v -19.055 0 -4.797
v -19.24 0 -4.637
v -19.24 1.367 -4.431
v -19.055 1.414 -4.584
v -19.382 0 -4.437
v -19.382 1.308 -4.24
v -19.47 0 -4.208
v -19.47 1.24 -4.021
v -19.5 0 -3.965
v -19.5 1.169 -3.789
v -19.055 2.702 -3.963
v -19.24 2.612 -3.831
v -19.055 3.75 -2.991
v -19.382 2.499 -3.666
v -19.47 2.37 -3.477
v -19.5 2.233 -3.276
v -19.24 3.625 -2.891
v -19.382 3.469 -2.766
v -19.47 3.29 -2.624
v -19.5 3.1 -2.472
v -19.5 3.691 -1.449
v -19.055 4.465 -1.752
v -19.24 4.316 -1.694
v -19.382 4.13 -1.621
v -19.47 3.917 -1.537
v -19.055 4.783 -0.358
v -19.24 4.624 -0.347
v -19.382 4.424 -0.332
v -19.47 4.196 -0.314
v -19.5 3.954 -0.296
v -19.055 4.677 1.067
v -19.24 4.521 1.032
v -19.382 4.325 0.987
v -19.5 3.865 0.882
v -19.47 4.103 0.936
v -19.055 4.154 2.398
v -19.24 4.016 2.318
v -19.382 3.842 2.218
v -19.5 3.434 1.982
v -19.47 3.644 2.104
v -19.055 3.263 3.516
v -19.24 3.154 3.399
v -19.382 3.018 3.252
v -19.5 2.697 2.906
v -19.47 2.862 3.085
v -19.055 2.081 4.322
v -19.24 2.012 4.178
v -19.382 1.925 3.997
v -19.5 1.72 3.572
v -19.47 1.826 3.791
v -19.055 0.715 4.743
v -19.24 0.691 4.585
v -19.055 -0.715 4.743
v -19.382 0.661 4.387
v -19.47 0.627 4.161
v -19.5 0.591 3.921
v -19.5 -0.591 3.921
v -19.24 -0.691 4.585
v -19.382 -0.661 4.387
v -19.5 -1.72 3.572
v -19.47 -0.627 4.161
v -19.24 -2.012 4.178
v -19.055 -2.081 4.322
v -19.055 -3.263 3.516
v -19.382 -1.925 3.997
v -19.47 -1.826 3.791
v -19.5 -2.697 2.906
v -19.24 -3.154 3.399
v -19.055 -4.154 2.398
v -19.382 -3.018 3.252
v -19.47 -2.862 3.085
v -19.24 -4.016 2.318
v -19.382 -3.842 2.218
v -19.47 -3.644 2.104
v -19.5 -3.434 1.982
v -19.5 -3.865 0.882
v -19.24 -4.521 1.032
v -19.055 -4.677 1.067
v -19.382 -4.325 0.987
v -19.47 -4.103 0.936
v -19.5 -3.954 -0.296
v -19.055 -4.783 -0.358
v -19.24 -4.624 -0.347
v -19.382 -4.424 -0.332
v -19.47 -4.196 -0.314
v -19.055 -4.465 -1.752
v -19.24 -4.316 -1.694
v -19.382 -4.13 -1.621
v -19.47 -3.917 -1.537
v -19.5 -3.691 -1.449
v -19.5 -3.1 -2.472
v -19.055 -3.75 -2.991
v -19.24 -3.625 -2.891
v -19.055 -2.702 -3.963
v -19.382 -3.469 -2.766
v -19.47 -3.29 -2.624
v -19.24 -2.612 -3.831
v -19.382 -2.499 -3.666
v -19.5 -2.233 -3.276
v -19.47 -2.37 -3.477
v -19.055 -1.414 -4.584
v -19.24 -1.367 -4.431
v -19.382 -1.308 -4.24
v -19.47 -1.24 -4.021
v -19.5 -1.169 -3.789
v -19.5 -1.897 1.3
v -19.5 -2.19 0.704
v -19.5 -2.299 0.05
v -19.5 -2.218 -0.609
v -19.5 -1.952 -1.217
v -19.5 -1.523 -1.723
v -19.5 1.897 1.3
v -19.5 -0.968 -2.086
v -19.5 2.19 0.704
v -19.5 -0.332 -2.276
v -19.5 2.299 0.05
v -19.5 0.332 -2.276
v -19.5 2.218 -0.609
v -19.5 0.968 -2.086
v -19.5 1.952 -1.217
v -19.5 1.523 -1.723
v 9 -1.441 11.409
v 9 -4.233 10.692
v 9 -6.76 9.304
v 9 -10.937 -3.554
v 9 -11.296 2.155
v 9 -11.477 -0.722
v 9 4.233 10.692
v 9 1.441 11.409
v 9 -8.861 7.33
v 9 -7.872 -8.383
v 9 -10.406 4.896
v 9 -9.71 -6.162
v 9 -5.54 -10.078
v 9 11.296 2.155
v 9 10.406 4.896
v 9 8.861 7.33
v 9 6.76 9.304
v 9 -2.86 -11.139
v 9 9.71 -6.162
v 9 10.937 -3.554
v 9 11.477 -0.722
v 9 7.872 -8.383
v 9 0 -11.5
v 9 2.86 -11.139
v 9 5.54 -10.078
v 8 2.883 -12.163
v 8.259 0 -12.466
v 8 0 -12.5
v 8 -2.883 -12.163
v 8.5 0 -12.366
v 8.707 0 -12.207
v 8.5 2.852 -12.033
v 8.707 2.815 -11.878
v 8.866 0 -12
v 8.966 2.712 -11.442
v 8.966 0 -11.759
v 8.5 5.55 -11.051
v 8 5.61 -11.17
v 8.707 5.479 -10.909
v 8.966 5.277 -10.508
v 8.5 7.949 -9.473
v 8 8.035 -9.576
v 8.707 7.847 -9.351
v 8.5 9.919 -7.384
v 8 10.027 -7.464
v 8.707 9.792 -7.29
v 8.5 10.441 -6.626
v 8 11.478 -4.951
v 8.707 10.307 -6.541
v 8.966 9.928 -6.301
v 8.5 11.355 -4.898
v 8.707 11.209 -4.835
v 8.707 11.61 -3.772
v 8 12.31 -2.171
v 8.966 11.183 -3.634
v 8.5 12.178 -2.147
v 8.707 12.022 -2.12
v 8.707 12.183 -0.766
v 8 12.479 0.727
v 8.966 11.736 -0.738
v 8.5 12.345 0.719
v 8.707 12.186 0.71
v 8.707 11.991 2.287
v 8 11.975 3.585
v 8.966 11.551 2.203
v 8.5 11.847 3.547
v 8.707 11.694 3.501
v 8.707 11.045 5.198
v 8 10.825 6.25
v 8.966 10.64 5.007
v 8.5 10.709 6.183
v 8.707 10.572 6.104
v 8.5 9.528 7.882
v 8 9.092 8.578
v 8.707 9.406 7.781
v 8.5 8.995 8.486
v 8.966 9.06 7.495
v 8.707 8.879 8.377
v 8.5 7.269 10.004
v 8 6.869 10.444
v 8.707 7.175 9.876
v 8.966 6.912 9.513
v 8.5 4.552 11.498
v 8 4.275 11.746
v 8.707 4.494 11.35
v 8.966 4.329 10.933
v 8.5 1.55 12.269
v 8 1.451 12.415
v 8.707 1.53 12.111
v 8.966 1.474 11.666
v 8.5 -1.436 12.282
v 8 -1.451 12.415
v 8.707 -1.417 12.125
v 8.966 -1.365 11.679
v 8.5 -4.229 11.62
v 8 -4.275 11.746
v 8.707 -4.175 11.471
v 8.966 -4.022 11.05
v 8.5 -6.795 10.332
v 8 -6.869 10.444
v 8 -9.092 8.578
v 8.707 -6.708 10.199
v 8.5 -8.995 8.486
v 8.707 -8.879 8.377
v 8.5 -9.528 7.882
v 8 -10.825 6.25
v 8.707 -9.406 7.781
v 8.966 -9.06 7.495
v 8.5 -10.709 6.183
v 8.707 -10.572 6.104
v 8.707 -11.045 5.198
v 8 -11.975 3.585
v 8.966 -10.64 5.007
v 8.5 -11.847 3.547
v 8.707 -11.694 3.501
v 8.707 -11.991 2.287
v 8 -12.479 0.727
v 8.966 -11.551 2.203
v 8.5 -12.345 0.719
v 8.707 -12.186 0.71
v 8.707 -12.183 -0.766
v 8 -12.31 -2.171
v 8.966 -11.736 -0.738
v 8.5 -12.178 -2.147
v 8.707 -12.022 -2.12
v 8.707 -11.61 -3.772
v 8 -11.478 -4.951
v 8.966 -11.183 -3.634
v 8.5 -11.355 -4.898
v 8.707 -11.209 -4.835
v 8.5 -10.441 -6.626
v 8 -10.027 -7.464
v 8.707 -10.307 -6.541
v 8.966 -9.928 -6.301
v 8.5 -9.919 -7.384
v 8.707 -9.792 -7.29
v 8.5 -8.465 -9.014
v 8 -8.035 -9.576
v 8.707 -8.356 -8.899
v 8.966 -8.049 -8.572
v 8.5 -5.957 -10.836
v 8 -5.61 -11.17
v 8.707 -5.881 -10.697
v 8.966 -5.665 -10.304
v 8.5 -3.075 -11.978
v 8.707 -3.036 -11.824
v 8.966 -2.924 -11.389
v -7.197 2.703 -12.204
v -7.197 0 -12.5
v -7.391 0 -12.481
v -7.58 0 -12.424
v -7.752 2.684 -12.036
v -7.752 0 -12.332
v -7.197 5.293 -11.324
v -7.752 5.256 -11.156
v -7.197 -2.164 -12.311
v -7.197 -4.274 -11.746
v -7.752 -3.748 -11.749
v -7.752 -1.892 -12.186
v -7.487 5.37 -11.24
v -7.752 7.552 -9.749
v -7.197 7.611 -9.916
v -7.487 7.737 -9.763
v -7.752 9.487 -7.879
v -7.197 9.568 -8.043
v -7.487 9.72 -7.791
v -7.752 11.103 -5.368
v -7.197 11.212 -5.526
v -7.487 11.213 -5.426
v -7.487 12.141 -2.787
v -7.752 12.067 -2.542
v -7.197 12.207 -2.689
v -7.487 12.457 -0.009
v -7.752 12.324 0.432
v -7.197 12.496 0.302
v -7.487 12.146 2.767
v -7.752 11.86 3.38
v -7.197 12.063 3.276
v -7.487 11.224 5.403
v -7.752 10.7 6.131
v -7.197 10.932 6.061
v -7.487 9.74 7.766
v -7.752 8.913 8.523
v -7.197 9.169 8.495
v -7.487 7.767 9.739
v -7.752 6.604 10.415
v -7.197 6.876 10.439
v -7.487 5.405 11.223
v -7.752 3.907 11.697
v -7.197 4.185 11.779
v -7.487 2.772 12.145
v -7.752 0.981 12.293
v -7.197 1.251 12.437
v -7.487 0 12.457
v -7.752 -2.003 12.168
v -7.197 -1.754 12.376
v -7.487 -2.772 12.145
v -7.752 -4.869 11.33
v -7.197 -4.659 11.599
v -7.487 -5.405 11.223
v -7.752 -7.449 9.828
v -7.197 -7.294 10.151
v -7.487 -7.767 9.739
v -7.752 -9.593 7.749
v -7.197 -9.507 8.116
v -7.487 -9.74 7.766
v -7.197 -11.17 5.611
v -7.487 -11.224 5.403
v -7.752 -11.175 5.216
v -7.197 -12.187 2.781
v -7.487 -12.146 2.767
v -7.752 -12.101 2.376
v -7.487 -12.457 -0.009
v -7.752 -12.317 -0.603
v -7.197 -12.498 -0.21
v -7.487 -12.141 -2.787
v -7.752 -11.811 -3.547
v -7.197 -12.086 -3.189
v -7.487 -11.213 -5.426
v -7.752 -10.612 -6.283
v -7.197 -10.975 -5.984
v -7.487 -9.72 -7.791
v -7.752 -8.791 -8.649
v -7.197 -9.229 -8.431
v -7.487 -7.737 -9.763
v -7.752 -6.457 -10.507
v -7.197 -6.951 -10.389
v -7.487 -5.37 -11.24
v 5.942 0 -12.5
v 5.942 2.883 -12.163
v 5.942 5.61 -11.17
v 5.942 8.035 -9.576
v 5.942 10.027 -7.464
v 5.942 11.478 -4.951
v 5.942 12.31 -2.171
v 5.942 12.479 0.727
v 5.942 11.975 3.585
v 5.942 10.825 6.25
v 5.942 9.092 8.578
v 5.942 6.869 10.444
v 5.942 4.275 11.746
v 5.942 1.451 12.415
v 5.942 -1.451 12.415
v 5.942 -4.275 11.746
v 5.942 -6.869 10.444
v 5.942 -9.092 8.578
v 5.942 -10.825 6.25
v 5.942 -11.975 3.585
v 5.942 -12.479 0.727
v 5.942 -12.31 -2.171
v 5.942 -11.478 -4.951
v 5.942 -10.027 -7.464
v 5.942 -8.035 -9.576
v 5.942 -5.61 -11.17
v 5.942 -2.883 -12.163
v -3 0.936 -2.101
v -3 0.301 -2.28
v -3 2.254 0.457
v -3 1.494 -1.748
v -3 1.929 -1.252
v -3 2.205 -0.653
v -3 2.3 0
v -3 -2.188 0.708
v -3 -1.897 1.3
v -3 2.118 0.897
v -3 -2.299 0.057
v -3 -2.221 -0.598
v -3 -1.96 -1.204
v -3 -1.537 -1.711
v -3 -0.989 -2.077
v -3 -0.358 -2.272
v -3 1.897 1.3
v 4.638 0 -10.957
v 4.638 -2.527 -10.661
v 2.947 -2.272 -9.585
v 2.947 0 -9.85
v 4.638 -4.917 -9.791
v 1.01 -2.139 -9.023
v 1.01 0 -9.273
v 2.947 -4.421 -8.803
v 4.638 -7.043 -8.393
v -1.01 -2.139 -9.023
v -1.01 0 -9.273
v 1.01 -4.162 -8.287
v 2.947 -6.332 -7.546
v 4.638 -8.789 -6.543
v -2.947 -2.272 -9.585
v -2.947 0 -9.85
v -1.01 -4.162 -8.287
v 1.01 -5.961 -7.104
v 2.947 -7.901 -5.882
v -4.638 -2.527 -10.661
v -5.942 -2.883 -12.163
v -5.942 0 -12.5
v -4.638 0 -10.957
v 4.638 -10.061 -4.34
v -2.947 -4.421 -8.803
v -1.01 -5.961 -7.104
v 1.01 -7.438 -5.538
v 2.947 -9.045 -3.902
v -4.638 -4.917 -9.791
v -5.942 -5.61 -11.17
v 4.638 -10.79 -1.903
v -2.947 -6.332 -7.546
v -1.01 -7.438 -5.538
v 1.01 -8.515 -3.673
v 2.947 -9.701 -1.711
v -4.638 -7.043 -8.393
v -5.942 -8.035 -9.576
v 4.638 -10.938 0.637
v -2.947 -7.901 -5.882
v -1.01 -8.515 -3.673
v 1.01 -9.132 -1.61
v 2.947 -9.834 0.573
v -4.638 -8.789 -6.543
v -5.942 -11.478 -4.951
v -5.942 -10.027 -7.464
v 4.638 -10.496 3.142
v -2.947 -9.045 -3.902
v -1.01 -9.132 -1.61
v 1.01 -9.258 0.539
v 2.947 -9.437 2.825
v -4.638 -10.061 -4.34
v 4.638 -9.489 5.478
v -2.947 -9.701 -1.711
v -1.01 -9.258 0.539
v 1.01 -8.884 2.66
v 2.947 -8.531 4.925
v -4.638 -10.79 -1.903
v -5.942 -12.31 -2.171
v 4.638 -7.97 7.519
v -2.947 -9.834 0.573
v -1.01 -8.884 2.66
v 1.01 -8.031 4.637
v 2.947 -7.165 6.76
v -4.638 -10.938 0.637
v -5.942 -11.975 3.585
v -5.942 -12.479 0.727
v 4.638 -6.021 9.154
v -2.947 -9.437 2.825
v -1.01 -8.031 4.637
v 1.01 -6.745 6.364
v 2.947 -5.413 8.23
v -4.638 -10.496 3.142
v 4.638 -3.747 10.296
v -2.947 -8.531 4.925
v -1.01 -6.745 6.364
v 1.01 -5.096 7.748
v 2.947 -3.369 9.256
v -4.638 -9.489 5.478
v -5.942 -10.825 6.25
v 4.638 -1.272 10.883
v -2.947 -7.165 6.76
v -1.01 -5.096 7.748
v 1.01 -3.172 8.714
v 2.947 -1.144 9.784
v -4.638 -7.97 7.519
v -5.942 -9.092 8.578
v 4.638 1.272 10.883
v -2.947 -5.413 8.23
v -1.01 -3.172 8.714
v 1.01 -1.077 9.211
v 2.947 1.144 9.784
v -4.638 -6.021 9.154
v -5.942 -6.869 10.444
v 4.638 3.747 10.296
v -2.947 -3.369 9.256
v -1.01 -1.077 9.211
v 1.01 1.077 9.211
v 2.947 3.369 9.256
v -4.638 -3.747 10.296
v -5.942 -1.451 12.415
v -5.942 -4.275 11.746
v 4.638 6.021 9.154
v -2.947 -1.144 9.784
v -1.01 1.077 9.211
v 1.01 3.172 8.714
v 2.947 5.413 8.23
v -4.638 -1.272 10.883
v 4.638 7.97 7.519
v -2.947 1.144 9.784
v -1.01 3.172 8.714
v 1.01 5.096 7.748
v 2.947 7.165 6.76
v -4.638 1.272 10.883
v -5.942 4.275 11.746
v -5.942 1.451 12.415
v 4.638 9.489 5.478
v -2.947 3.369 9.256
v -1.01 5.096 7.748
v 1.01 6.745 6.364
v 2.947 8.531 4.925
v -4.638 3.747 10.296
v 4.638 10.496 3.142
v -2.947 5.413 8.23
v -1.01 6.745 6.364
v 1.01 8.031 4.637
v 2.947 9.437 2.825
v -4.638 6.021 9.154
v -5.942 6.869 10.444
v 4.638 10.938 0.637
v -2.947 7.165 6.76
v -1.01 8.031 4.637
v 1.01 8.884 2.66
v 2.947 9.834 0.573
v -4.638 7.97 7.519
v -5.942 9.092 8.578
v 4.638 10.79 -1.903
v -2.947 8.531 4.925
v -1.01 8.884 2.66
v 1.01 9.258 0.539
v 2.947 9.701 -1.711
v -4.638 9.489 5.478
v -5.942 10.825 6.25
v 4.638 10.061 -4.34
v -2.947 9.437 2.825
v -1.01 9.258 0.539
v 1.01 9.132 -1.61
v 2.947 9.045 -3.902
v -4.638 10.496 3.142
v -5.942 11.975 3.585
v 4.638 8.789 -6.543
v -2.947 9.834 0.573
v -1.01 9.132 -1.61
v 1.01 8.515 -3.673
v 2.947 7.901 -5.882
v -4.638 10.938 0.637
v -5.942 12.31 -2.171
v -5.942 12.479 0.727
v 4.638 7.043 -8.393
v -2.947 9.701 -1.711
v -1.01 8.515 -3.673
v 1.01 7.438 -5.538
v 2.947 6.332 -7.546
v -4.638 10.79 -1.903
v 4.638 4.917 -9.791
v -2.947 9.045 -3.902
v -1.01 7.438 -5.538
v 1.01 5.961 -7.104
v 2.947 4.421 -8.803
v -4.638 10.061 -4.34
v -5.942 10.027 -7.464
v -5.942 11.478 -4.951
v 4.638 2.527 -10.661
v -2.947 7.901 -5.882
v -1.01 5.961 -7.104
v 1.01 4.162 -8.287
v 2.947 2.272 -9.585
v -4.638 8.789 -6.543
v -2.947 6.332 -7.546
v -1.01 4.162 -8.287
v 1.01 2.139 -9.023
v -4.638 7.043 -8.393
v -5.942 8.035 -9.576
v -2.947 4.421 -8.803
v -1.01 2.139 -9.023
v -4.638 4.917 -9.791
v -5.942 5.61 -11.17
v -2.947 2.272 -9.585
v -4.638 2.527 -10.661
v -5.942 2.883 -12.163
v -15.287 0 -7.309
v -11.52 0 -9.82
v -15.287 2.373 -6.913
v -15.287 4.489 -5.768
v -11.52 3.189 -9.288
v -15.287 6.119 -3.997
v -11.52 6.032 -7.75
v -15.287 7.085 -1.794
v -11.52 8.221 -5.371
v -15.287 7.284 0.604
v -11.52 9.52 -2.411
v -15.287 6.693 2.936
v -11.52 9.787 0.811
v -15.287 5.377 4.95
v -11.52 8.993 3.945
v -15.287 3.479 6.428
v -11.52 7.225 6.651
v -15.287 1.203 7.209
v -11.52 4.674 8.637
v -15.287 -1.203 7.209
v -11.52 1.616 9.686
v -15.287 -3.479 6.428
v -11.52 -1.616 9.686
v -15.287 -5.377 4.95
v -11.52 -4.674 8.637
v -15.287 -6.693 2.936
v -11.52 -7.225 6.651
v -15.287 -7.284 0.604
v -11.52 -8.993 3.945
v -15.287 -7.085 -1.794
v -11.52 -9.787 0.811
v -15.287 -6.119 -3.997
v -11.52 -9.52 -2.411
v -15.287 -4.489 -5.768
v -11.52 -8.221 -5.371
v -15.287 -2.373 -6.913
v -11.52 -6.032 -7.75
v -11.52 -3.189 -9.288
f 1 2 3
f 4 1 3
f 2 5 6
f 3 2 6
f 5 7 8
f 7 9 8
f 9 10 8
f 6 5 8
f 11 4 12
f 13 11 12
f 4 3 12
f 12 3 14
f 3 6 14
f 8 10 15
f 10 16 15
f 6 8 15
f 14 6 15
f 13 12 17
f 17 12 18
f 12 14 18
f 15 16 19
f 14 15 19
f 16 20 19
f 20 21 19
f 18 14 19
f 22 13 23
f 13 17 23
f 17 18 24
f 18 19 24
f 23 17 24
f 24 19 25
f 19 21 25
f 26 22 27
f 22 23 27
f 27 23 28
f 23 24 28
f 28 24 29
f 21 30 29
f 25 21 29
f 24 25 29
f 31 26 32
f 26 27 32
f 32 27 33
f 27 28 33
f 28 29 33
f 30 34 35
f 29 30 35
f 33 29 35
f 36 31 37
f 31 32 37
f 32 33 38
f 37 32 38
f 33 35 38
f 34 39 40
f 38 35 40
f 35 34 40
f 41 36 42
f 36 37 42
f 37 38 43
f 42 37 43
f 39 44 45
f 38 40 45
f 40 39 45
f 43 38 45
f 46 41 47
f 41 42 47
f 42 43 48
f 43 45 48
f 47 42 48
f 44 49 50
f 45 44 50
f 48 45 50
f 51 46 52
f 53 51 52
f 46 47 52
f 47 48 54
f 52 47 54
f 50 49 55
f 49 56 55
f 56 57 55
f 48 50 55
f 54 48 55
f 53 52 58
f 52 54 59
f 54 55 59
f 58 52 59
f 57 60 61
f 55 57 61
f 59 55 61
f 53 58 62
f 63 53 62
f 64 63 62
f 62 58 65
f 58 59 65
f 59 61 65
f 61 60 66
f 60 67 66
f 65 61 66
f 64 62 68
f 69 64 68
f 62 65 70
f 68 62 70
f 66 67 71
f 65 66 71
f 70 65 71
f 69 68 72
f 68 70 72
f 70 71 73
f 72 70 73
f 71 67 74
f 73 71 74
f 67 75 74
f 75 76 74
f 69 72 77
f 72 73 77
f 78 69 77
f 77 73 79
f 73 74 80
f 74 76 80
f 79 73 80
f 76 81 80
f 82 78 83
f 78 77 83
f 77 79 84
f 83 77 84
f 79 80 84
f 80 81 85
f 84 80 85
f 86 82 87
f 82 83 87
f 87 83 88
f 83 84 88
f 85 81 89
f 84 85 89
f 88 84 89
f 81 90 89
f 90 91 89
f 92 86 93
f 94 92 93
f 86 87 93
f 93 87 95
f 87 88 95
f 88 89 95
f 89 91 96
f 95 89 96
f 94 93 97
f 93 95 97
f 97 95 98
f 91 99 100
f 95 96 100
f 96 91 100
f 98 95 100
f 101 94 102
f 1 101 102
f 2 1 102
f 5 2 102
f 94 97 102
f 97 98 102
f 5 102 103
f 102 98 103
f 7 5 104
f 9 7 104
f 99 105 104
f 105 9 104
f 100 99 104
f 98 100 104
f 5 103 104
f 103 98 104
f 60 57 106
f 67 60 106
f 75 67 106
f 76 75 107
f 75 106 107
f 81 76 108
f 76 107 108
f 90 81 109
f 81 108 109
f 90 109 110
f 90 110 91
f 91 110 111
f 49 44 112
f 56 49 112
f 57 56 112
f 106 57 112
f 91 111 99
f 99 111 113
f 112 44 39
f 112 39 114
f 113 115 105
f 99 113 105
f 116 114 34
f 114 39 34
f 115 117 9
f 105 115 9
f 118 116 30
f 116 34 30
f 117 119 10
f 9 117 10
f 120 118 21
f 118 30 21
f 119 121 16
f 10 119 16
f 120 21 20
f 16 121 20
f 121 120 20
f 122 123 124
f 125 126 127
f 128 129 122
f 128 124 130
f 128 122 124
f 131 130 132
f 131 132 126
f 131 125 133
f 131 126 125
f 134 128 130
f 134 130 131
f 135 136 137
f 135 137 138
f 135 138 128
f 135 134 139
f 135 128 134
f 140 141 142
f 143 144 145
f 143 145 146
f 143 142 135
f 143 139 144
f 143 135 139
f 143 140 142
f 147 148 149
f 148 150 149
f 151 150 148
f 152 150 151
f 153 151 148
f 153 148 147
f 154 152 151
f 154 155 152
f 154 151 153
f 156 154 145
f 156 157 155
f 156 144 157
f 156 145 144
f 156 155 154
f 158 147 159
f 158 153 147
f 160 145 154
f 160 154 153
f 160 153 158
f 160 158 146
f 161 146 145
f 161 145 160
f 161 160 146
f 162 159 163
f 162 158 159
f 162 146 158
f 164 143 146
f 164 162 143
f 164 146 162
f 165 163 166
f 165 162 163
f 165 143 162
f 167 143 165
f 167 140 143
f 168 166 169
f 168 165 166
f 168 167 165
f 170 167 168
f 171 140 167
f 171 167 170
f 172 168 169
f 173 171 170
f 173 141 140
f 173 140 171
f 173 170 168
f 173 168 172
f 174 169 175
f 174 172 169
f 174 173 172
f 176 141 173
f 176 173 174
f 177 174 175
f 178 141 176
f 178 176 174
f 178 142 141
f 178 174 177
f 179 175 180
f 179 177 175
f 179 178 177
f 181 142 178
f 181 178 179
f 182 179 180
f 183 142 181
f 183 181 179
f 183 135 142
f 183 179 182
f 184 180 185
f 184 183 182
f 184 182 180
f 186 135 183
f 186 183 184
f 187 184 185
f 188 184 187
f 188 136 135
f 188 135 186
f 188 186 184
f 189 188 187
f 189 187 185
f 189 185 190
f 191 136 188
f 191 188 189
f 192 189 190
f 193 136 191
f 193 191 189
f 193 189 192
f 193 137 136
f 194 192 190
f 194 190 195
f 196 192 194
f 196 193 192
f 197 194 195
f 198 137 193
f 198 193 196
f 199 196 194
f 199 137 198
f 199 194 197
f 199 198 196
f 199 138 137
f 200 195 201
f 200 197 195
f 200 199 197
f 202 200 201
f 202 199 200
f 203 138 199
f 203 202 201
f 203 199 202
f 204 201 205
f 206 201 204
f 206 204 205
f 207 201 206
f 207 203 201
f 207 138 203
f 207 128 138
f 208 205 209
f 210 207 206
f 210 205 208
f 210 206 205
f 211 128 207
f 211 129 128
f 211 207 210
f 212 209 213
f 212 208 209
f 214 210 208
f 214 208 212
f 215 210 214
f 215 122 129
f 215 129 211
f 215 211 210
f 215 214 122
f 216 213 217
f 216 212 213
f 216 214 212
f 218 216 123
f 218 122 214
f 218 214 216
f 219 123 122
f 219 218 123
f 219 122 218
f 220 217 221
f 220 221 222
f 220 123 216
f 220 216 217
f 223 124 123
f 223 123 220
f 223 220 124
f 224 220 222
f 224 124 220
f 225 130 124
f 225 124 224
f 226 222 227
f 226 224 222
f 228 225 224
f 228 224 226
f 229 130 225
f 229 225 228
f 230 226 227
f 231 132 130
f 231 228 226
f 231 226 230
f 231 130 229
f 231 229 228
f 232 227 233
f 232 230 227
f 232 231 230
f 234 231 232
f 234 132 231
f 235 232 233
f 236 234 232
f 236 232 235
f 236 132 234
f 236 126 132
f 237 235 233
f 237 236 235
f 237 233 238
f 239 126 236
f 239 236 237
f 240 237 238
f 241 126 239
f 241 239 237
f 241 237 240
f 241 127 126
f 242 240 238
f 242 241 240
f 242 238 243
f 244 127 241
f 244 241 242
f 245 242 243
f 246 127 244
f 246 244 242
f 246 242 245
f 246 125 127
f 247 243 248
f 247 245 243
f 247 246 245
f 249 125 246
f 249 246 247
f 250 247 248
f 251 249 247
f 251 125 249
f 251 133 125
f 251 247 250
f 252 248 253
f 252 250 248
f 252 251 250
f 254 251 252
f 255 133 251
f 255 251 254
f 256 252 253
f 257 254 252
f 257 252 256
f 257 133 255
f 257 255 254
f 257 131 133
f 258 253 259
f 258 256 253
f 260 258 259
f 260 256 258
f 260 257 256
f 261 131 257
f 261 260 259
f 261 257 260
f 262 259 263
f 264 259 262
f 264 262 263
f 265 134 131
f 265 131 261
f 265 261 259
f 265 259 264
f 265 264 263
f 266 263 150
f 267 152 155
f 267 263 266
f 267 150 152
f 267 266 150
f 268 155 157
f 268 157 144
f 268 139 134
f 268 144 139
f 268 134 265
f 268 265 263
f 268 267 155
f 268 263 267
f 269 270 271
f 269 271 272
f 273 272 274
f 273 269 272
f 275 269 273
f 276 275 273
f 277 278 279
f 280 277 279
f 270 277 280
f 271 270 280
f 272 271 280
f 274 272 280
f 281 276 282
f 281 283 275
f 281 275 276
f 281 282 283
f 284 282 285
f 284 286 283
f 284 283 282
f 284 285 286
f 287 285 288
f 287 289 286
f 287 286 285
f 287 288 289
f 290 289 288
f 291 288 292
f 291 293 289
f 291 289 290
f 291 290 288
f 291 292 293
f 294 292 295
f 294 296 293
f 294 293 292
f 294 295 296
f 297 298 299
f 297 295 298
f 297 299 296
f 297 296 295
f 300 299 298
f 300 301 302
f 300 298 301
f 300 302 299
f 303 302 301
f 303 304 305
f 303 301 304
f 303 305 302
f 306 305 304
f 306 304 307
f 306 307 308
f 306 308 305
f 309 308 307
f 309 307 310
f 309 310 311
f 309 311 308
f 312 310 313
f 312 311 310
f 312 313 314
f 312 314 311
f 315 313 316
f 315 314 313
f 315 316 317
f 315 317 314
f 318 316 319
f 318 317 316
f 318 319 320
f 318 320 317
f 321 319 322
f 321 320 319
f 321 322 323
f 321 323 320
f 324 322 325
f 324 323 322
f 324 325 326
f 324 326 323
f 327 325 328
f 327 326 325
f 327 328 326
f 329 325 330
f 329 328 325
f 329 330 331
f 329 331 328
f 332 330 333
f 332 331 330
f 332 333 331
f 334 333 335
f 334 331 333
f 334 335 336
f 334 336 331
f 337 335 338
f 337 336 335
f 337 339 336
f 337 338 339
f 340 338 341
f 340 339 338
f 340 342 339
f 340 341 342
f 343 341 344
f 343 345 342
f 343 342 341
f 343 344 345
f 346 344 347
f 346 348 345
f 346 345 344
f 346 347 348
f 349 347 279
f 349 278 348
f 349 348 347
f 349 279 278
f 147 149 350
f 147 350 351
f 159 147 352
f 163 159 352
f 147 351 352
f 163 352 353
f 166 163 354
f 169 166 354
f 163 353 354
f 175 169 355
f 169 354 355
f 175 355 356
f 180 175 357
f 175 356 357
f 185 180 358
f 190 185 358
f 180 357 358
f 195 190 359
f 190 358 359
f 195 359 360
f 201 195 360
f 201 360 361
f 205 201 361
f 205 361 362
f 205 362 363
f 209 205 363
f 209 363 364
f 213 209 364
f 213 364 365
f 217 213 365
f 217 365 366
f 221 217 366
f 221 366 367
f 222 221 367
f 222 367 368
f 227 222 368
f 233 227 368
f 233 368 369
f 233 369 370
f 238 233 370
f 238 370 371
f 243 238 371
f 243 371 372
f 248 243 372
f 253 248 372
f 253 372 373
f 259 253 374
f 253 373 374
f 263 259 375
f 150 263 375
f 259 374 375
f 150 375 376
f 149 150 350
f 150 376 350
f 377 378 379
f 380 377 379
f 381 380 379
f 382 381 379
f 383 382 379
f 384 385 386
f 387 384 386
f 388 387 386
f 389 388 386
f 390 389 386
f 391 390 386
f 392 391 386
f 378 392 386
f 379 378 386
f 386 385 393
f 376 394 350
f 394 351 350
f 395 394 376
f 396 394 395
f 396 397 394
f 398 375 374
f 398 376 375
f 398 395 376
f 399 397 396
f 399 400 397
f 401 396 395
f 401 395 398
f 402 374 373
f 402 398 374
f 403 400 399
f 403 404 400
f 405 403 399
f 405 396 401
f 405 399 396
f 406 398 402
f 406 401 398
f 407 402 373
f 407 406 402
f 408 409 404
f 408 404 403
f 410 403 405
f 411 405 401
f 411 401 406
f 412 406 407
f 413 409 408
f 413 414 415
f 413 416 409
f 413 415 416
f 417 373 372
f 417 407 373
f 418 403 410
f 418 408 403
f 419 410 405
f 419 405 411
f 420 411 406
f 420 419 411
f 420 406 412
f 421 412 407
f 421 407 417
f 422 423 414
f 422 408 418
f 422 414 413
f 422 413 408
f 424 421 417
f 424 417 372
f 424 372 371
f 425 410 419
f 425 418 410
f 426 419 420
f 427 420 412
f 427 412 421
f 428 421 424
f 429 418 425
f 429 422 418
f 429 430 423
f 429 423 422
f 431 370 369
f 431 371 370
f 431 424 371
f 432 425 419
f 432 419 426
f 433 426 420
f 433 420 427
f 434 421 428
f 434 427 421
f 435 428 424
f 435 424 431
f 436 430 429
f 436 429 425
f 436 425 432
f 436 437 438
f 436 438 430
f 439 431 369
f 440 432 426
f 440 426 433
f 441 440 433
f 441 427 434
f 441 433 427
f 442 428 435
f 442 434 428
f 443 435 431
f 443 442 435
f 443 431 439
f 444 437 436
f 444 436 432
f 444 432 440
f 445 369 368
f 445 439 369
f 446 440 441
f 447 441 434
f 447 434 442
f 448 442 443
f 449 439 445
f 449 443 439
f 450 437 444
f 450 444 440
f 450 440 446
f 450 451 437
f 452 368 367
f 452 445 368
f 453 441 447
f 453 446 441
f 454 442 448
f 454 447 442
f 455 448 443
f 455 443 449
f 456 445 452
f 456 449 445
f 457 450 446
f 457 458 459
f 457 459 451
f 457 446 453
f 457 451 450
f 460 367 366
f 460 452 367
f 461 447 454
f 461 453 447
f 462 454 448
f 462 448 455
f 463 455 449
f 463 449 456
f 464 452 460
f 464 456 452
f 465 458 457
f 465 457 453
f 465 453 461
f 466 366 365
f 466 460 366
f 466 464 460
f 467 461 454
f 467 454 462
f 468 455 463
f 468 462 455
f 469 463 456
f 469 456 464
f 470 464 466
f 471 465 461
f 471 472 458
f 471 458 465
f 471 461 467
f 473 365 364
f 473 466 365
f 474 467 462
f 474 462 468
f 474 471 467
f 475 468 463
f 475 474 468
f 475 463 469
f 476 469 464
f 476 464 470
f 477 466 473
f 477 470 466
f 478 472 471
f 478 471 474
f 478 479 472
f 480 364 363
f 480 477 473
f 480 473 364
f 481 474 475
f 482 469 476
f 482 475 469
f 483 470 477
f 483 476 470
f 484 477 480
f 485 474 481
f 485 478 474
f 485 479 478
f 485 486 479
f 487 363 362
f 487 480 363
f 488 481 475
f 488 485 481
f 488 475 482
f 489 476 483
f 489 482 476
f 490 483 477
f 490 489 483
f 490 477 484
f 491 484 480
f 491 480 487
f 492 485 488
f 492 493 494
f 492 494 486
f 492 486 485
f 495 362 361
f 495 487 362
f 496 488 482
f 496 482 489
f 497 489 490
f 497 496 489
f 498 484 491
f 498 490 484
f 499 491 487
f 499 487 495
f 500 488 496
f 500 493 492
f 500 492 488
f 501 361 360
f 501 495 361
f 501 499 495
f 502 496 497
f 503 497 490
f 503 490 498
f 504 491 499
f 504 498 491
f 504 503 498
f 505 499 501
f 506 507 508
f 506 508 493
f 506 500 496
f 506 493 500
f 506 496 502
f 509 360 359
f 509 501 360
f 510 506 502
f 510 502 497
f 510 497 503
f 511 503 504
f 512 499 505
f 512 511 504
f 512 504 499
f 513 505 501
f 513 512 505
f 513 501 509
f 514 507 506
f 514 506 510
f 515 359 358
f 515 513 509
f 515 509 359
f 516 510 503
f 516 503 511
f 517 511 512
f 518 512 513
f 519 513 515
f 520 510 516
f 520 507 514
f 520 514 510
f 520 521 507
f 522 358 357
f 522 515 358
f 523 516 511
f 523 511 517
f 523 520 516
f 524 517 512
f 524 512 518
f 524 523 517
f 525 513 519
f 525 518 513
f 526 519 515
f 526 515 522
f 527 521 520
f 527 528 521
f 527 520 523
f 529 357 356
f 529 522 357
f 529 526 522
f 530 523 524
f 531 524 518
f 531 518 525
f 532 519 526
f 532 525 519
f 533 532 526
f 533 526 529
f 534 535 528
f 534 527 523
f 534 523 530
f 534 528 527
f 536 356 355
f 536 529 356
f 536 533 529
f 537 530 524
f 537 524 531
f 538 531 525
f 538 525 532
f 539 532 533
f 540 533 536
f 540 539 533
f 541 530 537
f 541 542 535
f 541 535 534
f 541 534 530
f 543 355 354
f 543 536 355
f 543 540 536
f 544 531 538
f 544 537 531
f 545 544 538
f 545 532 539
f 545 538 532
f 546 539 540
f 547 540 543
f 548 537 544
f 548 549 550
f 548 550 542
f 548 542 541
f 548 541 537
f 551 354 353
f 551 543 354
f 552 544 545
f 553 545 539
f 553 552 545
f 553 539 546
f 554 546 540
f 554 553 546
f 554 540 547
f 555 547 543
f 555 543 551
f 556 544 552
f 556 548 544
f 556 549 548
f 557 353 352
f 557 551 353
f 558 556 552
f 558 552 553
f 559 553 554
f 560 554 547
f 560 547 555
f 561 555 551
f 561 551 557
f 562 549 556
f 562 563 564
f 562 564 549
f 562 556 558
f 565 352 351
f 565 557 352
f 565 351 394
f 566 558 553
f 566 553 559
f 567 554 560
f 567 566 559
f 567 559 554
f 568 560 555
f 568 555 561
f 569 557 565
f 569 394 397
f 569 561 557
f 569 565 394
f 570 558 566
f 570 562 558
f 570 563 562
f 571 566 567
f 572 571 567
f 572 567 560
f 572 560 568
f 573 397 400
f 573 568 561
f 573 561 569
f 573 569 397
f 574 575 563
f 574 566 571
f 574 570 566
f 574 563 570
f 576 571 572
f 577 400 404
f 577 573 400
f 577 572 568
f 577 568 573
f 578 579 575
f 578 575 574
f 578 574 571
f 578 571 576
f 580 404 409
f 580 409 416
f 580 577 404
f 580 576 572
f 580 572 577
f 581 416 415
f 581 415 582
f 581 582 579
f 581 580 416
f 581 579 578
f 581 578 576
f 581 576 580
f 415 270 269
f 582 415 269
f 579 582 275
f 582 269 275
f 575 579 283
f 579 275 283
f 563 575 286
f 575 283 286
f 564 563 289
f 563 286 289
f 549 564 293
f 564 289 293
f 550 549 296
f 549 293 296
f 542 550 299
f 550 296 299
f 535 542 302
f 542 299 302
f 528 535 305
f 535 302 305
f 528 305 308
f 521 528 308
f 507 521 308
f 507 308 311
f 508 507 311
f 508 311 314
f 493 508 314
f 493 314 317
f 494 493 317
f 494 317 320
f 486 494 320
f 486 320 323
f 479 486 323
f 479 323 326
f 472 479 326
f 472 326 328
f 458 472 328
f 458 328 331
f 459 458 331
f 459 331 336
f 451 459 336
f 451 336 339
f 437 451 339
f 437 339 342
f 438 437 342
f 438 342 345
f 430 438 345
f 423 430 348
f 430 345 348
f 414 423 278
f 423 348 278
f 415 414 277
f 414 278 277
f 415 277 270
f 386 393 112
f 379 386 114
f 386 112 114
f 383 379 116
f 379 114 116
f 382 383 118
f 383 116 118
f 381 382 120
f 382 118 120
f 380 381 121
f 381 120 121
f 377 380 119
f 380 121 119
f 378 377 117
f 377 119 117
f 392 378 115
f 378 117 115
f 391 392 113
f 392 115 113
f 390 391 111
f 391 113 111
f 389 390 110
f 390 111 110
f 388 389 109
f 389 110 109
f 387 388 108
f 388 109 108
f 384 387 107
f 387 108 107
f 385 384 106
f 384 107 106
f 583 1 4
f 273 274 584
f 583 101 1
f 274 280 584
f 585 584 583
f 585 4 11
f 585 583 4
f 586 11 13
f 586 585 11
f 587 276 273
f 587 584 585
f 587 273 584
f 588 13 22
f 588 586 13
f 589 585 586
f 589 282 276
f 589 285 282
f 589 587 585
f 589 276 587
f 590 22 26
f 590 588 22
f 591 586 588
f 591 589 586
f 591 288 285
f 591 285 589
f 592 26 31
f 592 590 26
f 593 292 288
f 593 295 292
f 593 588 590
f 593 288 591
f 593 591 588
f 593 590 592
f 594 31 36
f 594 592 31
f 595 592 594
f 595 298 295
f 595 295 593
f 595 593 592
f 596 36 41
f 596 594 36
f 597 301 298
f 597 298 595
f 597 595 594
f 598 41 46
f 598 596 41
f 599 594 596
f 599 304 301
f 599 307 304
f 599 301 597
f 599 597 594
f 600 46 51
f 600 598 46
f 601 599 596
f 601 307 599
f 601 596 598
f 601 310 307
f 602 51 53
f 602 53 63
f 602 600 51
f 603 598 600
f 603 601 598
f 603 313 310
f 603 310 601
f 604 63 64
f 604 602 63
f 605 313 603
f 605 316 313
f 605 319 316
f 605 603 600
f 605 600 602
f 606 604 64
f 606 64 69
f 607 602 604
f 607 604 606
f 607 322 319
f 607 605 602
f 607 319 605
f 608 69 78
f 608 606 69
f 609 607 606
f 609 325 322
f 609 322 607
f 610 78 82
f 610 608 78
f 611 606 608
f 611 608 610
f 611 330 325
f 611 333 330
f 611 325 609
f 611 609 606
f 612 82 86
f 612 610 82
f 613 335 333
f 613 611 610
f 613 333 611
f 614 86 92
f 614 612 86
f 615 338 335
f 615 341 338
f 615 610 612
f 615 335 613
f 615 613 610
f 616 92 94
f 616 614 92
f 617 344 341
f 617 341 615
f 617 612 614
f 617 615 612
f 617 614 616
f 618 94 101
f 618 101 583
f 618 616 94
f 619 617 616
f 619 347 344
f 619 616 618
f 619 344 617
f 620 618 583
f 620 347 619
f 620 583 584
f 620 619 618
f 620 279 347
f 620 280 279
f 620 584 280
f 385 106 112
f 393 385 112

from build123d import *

# Parameters (mm, degrees)
SALIENTE_EXTRUIR1_DEPTH      = 9
SALIENTE_EXTRUIR1_DEPTH_BACK = 19.5
CROQUIS1_R                   = 12.5
CROQUIS2_R                   = 7
CHAFL_N1_SIZE                = 8
CHAFL_N1_SIZE2               = 12
REDONDEO1_R                  = 1
REDONDEO2_R                  = 1
SALIENTE_EXTRUIR2_START      = -3
SALIENTE_EXTRUIR2_DEPTH      = 12


with BuildPart() as part:
    # Croquis1 → Saliente-Extruir1 (new, two sides: drawn at the far end of the back side and taken through both)
    with BuildSketch(Plane.YZ.offset(-SALIENTE_EXTRUIR1_DEPTH_BACK)):
        with Locations(Location((0, 0, 0), (0, 0, 270))):
            Circle(CROQUIS1_R)
        with BuildLine():
            Line((-1.897366596, 1.3), (1.897366596, 1.3))
            ThreePointArc((1.897366596, 1.3), (0, -2.3), (-1.897366596, 1.3))
        make_face(mode=Mode.SUBTRACT)
    extrude(amount=SALIENTE_EXTRUIR1_DEPTH + SALIENTE_EXTRUIR1_DEPTH_BACK)

    # Croquis2 → Cortar-Revolución1 (revolve, cut)
    with BuildSketch(Plane(origin=(0, 0, 0), x_dir=(-1, 0, 0), z_dir=(0, 1, 0)), mode=Mode.PRIVATE) as cortar_revoluci_n1_sk:
        with Locations((0, 16.2)):
            Circle(CROQUIS2_R)
    revolve(cortar_revoluci_n1_sk.sketch.rotate(Axis((7.517678172, 0, 0), (-1, 0, 0)), 180), axis=Axis((7.517678172, 0, 0), (-1, 0, 0)), mode=Mode.SUBTRACT)

    # Chaflán1
    chafl_n1_edges = [part.edges().sort_by_distance(p)[0] for p in [
        (-19.5, 0, 12.5),
    ]]
    chafl_n1_side = [part.faces().sort_by_distance(p)[0] for p in [
        (-19.5, 0, 12.146446609),
    ]]
    chamfer(chafl_n1_edges, length=CHAFL_N1_SIZE, length2=CHAFL_N1_SIZE2, reference=chafl_n1_side[0])

    # Redondeo1
    redondeo1_edges = [part.edges().sort_by_distance(p)[0] for p in [
        (-7.5, 0, 12.5),
        (-19.5, 0, 4.5),
    ]]
    fillet(redondeo1_edges, radius=REDONDEO1_R)

    # Redondeo2
    redondeo2_edges = [part.edges().sort_by_distance(p)[0] for p in [
        (9, 0, 12.5),
    ]]
    fillet(redondeo2_edges, radius=REDONDEO2_R)

    # Croquis1<3> → Saliente-Extruir2 (add)
    with BuildSketch(Plane.YZ.offset(SALIENTE_EXTRUIR2_START)):
        with BuildLine():
            ThreePointArc((2.3, 0), (2.197037001, 0.680461913), (1.897366596, 1.3))
            Line((1.897366596, 1.3), (-1.897366596, 1.3))
            ThreePointArc((-1.897366596, 1.3), (-0.680461913, -2.197037001), (2.3, 0))
        make_face()
        with BuildLine():
            Line((-1.897366596, 1.3), (1.897366596, 1.3))
            ThreePointArc((1.897366596, 1.3), (0, 2.3), (-1.897366596, 1.3))
        make_face()
    extrude(amount=SALIENTE_EXTRUIR2_DEPTH)


solid = part.part
